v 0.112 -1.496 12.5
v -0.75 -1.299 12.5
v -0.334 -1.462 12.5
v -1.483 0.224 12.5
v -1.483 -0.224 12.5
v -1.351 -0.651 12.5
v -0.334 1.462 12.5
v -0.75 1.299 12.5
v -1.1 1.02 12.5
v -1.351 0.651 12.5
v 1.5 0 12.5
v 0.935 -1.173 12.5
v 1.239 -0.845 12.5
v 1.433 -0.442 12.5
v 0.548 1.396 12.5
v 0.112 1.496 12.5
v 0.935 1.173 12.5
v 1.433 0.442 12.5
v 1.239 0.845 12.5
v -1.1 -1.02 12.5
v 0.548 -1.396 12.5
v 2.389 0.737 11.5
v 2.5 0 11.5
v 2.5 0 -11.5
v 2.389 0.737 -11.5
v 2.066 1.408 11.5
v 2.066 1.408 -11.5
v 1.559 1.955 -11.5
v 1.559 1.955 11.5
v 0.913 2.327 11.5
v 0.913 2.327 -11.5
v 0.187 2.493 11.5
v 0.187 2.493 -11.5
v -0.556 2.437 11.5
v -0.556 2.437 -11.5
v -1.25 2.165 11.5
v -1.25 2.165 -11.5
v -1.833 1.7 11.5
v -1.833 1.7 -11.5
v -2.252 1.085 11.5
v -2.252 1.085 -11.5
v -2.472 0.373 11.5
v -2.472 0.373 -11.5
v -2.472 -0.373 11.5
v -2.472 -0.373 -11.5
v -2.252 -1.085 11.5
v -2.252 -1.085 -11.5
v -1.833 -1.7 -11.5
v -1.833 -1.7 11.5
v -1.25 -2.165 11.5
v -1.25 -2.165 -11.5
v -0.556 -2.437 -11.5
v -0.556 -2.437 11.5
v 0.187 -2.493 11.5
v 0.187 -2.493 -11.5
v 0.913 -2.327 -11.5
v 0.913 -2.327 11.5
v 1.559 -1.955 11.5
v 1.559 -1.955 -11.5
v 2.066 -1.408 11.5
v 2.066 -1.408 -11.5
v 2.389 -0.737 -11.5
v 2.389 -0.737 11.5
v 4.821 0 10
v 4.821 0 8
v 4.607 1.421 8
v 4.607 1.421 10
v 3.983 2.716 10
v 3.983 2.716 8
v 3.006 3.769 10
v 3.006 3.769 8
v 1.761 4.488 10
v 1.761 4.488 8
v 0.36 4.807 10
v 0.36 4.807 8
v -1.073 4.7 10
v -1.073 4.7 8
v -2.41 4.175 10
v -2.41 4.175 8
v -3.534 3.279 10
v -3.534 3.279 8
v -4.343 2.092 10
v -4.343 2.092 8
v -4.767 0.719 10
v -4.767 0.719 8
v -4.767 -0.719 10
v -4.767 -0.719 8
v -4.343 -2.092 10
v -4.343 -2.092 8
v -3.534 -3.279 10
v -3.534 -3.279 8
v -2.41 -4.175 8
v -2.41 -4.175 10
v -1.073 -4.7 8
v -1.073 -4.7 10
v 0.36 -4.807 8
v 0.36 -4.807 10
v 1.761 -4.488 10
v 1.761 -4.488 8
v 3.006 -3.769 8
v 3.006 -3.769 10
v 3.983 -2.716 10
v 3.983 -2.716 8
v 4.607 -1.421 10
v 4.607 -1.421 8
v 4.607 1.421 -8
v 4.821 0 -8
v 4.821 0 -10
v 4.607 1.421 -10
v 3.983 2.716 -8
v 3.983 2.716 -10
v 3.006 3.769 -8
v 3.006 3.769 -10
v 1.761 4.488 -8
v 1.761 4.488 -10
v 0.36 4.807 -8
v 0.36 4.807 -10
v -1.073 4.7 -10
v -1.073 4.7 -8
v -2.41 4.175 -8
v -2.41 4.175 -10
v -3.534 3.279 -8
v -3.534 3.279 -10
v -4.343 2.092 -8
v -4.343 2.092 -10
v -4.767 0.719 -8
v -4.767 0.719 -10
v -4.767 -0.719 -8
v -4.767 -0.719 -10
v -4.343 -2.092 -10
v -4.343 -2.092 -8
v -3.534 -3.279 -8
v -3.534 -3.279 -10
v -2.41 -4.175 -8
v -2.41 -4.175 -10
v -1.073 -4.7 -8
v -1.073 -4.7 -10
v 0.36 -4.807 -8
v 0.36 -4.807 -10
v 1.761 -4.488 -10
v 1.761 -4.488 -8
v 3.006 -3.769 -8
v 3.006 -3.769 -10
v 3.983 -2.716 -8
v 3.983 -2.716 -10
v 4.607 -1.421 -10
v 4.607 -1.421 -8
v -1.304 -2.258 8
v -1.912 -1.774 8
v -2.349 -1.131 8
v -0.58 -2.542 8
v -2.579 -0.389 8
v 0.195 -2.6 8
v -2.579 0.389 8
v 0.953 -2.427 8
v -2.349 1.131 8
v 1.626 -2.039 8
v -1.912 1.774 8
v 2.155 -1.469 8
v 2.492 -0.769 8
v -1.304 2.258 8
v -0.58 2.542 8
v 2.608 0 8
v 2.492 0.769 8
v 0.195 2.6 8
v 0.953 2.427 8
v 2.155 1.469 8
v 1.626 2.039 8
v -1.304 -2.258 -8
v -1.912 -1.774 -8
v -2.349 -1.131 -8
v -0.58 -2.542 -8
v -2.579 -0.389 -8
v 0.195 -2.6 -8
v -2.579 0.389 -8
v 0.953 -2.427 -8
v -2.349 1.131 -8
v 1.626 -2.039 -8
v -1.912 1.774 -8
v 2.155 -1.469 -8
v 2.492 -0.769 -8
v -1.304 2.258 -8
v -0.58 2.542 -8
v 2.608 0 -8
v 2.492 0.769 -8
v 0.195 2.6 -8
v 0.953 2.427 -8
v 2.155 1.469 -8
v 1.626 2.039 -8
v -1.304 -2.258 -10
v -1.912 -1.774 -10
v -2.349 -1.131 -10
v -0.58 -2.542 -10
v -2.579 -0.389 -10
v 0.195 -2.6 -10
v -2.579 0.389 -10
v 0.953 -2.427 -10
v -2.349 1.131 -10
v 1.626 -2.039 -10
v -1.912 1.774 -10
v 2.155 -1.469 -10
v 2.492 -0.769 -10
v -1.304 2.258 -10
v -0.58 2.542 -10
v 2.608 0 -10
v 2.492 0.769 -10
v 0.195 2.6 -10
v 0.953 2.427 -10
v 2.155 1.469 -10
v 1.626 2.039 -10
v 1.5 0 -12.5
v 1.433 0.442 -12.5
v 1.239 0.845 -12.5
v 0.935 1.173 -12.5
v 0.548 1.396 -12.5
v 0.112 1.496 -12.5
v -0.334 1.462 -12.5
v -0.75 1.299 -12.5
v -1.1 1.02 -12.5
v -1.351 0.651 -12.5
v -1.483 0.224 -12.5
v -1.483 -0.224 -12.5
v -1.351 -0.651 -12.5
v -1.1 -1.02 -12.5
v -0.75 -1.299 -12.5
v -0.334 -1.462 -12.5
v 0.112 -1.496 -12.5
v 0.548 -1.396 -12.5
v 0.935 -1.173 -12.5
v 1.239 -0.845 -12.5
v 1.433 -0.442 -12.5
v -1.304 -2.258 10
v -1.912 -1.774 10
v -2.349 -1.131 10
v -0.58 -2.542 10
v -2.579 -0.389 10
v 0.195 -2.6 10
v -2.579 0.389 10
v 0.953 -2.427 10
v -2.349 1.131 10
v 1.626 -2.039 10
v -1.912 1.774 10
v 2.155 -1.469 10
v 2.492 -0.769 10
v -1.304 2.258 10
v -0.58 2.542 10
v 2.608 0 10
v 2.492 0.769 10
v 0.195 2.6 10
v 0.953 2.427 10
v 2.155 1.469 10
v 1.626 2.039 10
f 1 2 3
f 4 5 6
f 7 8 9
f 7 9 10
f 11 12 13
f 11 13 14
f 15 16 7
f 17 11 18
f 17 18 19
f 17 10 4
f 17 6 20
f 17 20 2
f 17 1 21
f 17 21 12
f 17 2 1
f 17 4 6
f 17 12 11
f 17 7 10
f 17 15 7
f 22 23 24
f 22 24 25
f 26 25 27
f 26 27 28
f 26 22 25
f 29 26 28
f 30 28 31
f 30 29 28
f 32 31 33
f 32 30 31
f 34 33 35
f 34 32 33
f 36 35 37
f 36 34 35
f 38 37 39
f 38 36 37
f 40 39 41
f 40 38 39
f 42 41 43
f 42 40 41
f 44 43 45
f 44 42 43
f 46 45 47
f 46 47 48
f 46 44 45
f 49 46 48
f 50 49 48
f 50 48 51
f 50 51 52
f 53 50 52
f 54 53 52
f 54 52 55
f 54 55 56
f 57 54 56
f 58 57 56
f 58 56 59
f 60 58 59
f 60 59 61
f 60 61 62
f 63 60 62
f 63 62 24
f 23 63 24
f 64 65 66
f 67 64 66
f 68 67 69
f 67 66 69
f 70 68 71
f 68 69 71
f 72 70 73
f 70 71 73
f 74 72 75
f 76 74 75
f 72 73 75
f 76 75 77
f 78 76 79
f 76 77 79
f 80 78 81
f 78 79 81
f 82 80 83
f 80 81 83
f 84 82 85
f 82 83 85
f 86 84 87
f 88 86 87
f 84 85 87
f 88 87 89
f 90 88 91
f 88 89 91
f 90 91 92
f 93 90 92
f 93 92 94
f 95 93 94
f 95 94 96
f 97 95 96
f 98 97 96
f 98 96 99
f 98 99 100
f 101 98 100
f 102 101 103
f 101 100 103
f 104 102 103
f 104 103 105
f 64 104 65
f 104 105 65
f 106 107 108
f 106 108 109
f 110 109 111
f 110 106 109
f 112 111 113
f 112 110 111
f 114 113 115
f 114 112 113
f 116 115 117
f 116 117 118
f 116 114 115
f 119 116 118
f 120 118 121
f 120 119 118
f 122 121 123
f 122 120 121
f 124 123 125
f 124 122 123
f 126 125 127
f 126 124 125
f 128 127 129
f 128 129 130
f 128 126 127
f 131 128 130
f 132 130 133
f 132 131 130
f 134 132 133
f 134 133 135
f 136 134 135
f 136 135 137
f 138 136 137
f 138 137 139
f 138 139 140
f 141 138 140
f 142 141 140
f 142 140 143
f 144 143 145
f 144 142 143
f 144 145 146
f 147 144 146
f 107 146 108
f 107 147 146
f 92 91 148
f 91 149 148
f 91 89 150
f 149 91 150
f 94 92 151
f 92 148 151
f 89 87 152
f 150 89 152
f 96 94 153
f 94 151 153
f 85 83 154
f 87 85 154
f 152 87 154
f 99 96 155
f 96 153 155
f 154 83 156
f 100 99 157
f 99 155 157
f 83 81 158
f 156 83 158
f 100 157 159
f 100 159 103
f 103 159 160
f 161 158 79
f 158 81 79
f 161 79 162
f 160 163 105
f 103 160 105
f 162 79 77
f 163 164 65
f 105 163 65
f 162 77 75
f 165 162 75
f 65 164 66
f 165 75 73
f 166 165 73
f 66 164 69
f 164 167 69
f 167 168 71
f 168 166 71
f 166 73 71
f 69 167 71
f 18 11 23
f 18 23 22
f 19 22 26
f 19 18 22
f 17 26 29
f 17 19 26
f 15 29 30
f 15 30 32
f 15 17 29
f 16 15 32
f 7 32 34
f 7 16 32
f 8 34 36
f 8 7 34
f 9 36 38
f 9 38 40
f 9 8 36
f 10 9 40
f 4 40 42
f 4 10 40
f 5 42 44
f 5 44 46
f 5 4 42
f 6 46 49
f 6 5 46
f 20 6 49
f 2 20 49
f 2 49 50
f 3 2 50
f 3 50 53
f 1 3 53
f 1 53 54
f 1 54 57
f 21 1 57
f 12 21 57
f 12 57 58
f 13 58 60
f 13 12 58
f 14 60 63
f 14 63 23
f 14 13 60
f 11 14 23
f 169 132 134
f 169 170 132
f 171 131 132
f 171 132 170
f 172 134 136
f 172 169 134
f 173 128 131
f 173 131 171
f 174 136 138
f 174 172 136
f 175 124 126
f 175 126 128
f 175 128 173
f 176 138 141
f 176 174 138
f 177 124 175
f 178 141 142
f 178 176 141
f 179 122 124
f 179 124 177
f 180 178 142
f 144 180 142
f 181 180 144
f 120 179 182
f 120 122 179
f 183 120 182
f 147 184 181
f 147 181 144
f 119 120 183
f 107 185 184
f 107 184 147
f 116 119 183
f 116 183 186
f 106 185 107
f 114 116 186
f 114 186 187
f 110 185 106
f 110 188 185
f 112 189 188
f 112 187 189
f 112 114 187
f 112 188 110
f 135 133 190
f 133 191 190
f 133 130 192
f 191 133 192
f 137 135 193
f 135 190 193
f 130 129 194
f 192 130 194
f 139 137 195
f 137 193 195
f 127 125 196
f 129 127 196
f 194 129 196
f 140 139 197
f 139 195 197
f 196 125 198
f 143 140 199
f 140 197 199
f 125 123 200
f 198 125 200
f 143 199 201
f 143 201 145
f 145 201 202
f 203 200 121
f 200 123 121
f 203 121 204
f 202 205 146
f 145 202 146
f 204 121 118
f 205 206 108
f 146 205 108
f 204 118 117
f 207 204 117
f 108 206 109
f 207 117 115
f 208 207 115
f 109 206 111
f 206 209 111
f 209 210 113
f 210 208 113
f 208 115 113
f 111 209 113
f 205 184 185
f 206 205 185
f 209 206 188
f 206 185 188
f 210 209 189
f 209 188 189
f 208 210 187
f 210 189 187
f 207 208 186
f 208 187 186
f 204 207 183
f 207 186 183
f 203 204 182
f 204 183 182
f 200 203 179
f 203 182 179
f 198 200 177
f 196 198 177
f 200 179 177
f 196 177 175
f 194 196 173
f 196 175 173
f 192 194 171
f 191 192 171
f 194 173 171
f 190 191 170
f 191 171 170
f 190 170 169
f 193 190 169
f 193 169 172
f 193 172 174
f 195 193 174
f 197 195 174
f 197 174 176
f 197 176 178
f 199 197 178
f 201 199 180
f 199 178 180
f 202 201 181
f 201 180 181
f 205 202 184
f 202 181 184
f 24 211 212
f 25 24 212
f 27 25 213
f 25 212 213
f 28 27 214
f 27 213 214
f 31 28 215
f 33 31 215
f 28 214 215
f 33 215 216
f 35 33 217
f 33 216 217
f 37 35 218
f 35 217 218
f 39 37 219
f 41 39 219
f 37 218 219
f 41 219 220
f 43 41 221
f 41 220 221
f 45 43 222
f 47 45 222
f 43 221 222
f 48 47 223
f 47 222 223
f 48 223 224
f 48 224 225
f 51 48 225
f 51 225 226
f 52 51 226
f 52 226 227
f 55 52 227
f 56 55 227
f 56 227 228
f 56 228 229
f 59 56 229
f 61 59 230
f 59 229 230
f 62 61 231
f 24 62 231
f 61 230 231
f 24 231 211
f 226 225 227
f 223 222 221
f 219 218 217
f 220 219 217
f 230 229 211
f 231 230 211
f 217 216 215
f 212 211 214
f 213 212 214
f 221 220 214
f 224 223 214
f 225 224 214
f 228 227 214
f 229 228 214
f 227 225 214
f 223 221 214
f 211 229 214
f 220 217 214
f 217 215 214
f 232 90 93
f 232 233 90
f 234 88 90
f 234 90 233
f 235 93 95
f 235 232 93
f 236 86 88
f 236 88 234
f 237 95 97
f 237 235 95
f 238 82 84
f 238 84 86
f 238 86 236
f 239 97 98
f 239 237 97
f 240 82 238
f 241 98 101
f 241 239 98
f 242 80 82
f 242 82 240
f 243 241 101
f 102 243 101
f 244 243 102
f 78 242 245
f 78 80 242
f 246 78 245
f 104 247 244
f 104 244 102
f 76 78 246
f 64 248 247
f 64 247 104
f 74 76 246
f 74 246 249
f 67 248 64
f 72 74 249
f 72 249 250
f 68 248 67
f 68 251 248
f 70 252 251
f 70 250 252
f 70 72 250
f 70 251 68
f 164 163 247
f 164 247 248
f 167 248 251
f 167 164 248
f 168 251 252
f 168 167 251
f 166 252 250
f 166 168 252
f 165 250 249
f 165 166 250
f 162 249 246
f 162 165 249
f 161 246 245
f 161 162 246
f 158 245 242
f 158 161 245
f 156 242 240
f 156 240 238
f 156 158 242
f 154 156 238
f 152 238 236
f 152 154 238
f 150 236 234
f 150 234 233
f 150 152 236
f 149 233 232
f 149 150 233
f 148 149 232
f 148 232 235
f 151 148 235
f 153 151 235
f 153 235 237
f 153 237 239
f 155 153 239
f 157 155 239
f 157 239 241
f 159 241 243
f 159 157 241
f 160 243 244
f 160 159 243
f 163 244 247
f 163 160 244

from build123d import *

# Parameters (mm, degrees)
SKETCH1_R           = 2.5
BOSS_EXTRUDE1_DEPTH = 12.5
CHAMFER1_SIZE       = 1
SKETCH2_R           = 4.820793463
SKETCH2_R_2         = 2.607744367
BOSS_EXTRUDE2_DEPTH = 2


with BuildPart() as part:
    # Sketch1 → Boss-Extrude1 (new, symmetric)
    with BuildSketch(Plane.XY):
        Circle(SKETCH1_R)
    extrude(amount=BOSS_EXTRUDE1_DEPTH, both=True)

    # Chamfer1
    chamfer1_edges = [part.edges().sort_by_distance(p)[0] for p in [
        (-2.5, 0, -12.5),
        (-2.5, 0, 12.5),
    ]]
    chamfer(chamfer1_edges, length=CHAMFER1_SIZE)


with BuildPart() as body_2:
    # Sketch2 → Boss-Extrude2 (new body)
    with BuildSketch(Plane.XY.offset(8)):
        Circle(SKETCH2_R)
        Circle(SKETCH2_R_2, mode=Mode.SUBTRACT)
    extrude(amount=BOSS_EXTRUDE2_DEPTH)


with BuildPart() as body_3:
    # Mirror2: mirrored copy
    add(body_2.part.mirror(Plane.XY))


solid = Compound([part.part, body_2.part, body_3.part])
